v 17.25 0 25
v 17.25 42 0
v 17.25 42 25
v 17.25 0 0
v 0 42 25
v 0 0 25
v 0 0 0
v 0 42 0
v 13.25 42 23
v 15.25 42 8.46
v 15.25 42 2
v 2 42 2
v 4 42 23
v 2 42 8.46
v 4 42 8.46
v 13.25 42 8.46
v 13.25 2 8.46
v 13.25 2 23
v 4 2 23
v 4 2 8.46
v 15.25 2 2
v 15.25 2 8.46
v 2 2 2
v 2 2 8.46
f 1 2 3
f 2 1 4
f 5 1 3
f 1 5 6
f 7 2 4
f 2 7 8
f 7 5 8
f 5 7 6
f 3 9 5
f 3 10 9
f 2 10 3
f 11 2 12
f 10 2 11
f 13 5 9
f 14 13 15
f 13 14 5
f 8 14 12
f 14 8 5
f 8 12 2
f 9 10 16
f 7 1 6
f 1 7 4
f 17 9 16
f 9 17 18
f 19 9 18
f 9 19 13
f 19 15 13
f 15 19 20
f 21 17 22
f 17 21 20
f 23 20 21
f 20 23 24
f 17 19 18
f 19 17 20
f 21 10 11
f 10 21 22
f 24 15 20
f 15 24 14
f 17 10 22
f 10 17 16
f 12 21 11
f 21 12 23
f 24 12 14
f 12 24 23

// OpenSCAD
// general parameters
$fn = 90;
eps = 0.01;
tol = 0.25;

// brush parameter
b_W = 13+tol;
b_w = 9+tol;
b_t = 6.2+tol;
b_h = 21;
b_l = 40;

w_t = 2;

module brush_cover()
{
    x = b_W + 2*w_t;
    y = b_l+w_t;
    z = b_h+2*w_t;
    difference()
    {
        // base block
        cube([x,y,z]);
        
        // brush "hair" cut
        translate([w_t+(b_W-b_w)/2, w_t, w_t+b_t-eps])
            cube([b_w,b_l+eps,b_h-b_t+eps]);
        
        // solit part cat
        translate([w_t,w_t,w_t]) cube([b_W,b_l+eps,b_t+eps]);
    }
}

brush_cover();
